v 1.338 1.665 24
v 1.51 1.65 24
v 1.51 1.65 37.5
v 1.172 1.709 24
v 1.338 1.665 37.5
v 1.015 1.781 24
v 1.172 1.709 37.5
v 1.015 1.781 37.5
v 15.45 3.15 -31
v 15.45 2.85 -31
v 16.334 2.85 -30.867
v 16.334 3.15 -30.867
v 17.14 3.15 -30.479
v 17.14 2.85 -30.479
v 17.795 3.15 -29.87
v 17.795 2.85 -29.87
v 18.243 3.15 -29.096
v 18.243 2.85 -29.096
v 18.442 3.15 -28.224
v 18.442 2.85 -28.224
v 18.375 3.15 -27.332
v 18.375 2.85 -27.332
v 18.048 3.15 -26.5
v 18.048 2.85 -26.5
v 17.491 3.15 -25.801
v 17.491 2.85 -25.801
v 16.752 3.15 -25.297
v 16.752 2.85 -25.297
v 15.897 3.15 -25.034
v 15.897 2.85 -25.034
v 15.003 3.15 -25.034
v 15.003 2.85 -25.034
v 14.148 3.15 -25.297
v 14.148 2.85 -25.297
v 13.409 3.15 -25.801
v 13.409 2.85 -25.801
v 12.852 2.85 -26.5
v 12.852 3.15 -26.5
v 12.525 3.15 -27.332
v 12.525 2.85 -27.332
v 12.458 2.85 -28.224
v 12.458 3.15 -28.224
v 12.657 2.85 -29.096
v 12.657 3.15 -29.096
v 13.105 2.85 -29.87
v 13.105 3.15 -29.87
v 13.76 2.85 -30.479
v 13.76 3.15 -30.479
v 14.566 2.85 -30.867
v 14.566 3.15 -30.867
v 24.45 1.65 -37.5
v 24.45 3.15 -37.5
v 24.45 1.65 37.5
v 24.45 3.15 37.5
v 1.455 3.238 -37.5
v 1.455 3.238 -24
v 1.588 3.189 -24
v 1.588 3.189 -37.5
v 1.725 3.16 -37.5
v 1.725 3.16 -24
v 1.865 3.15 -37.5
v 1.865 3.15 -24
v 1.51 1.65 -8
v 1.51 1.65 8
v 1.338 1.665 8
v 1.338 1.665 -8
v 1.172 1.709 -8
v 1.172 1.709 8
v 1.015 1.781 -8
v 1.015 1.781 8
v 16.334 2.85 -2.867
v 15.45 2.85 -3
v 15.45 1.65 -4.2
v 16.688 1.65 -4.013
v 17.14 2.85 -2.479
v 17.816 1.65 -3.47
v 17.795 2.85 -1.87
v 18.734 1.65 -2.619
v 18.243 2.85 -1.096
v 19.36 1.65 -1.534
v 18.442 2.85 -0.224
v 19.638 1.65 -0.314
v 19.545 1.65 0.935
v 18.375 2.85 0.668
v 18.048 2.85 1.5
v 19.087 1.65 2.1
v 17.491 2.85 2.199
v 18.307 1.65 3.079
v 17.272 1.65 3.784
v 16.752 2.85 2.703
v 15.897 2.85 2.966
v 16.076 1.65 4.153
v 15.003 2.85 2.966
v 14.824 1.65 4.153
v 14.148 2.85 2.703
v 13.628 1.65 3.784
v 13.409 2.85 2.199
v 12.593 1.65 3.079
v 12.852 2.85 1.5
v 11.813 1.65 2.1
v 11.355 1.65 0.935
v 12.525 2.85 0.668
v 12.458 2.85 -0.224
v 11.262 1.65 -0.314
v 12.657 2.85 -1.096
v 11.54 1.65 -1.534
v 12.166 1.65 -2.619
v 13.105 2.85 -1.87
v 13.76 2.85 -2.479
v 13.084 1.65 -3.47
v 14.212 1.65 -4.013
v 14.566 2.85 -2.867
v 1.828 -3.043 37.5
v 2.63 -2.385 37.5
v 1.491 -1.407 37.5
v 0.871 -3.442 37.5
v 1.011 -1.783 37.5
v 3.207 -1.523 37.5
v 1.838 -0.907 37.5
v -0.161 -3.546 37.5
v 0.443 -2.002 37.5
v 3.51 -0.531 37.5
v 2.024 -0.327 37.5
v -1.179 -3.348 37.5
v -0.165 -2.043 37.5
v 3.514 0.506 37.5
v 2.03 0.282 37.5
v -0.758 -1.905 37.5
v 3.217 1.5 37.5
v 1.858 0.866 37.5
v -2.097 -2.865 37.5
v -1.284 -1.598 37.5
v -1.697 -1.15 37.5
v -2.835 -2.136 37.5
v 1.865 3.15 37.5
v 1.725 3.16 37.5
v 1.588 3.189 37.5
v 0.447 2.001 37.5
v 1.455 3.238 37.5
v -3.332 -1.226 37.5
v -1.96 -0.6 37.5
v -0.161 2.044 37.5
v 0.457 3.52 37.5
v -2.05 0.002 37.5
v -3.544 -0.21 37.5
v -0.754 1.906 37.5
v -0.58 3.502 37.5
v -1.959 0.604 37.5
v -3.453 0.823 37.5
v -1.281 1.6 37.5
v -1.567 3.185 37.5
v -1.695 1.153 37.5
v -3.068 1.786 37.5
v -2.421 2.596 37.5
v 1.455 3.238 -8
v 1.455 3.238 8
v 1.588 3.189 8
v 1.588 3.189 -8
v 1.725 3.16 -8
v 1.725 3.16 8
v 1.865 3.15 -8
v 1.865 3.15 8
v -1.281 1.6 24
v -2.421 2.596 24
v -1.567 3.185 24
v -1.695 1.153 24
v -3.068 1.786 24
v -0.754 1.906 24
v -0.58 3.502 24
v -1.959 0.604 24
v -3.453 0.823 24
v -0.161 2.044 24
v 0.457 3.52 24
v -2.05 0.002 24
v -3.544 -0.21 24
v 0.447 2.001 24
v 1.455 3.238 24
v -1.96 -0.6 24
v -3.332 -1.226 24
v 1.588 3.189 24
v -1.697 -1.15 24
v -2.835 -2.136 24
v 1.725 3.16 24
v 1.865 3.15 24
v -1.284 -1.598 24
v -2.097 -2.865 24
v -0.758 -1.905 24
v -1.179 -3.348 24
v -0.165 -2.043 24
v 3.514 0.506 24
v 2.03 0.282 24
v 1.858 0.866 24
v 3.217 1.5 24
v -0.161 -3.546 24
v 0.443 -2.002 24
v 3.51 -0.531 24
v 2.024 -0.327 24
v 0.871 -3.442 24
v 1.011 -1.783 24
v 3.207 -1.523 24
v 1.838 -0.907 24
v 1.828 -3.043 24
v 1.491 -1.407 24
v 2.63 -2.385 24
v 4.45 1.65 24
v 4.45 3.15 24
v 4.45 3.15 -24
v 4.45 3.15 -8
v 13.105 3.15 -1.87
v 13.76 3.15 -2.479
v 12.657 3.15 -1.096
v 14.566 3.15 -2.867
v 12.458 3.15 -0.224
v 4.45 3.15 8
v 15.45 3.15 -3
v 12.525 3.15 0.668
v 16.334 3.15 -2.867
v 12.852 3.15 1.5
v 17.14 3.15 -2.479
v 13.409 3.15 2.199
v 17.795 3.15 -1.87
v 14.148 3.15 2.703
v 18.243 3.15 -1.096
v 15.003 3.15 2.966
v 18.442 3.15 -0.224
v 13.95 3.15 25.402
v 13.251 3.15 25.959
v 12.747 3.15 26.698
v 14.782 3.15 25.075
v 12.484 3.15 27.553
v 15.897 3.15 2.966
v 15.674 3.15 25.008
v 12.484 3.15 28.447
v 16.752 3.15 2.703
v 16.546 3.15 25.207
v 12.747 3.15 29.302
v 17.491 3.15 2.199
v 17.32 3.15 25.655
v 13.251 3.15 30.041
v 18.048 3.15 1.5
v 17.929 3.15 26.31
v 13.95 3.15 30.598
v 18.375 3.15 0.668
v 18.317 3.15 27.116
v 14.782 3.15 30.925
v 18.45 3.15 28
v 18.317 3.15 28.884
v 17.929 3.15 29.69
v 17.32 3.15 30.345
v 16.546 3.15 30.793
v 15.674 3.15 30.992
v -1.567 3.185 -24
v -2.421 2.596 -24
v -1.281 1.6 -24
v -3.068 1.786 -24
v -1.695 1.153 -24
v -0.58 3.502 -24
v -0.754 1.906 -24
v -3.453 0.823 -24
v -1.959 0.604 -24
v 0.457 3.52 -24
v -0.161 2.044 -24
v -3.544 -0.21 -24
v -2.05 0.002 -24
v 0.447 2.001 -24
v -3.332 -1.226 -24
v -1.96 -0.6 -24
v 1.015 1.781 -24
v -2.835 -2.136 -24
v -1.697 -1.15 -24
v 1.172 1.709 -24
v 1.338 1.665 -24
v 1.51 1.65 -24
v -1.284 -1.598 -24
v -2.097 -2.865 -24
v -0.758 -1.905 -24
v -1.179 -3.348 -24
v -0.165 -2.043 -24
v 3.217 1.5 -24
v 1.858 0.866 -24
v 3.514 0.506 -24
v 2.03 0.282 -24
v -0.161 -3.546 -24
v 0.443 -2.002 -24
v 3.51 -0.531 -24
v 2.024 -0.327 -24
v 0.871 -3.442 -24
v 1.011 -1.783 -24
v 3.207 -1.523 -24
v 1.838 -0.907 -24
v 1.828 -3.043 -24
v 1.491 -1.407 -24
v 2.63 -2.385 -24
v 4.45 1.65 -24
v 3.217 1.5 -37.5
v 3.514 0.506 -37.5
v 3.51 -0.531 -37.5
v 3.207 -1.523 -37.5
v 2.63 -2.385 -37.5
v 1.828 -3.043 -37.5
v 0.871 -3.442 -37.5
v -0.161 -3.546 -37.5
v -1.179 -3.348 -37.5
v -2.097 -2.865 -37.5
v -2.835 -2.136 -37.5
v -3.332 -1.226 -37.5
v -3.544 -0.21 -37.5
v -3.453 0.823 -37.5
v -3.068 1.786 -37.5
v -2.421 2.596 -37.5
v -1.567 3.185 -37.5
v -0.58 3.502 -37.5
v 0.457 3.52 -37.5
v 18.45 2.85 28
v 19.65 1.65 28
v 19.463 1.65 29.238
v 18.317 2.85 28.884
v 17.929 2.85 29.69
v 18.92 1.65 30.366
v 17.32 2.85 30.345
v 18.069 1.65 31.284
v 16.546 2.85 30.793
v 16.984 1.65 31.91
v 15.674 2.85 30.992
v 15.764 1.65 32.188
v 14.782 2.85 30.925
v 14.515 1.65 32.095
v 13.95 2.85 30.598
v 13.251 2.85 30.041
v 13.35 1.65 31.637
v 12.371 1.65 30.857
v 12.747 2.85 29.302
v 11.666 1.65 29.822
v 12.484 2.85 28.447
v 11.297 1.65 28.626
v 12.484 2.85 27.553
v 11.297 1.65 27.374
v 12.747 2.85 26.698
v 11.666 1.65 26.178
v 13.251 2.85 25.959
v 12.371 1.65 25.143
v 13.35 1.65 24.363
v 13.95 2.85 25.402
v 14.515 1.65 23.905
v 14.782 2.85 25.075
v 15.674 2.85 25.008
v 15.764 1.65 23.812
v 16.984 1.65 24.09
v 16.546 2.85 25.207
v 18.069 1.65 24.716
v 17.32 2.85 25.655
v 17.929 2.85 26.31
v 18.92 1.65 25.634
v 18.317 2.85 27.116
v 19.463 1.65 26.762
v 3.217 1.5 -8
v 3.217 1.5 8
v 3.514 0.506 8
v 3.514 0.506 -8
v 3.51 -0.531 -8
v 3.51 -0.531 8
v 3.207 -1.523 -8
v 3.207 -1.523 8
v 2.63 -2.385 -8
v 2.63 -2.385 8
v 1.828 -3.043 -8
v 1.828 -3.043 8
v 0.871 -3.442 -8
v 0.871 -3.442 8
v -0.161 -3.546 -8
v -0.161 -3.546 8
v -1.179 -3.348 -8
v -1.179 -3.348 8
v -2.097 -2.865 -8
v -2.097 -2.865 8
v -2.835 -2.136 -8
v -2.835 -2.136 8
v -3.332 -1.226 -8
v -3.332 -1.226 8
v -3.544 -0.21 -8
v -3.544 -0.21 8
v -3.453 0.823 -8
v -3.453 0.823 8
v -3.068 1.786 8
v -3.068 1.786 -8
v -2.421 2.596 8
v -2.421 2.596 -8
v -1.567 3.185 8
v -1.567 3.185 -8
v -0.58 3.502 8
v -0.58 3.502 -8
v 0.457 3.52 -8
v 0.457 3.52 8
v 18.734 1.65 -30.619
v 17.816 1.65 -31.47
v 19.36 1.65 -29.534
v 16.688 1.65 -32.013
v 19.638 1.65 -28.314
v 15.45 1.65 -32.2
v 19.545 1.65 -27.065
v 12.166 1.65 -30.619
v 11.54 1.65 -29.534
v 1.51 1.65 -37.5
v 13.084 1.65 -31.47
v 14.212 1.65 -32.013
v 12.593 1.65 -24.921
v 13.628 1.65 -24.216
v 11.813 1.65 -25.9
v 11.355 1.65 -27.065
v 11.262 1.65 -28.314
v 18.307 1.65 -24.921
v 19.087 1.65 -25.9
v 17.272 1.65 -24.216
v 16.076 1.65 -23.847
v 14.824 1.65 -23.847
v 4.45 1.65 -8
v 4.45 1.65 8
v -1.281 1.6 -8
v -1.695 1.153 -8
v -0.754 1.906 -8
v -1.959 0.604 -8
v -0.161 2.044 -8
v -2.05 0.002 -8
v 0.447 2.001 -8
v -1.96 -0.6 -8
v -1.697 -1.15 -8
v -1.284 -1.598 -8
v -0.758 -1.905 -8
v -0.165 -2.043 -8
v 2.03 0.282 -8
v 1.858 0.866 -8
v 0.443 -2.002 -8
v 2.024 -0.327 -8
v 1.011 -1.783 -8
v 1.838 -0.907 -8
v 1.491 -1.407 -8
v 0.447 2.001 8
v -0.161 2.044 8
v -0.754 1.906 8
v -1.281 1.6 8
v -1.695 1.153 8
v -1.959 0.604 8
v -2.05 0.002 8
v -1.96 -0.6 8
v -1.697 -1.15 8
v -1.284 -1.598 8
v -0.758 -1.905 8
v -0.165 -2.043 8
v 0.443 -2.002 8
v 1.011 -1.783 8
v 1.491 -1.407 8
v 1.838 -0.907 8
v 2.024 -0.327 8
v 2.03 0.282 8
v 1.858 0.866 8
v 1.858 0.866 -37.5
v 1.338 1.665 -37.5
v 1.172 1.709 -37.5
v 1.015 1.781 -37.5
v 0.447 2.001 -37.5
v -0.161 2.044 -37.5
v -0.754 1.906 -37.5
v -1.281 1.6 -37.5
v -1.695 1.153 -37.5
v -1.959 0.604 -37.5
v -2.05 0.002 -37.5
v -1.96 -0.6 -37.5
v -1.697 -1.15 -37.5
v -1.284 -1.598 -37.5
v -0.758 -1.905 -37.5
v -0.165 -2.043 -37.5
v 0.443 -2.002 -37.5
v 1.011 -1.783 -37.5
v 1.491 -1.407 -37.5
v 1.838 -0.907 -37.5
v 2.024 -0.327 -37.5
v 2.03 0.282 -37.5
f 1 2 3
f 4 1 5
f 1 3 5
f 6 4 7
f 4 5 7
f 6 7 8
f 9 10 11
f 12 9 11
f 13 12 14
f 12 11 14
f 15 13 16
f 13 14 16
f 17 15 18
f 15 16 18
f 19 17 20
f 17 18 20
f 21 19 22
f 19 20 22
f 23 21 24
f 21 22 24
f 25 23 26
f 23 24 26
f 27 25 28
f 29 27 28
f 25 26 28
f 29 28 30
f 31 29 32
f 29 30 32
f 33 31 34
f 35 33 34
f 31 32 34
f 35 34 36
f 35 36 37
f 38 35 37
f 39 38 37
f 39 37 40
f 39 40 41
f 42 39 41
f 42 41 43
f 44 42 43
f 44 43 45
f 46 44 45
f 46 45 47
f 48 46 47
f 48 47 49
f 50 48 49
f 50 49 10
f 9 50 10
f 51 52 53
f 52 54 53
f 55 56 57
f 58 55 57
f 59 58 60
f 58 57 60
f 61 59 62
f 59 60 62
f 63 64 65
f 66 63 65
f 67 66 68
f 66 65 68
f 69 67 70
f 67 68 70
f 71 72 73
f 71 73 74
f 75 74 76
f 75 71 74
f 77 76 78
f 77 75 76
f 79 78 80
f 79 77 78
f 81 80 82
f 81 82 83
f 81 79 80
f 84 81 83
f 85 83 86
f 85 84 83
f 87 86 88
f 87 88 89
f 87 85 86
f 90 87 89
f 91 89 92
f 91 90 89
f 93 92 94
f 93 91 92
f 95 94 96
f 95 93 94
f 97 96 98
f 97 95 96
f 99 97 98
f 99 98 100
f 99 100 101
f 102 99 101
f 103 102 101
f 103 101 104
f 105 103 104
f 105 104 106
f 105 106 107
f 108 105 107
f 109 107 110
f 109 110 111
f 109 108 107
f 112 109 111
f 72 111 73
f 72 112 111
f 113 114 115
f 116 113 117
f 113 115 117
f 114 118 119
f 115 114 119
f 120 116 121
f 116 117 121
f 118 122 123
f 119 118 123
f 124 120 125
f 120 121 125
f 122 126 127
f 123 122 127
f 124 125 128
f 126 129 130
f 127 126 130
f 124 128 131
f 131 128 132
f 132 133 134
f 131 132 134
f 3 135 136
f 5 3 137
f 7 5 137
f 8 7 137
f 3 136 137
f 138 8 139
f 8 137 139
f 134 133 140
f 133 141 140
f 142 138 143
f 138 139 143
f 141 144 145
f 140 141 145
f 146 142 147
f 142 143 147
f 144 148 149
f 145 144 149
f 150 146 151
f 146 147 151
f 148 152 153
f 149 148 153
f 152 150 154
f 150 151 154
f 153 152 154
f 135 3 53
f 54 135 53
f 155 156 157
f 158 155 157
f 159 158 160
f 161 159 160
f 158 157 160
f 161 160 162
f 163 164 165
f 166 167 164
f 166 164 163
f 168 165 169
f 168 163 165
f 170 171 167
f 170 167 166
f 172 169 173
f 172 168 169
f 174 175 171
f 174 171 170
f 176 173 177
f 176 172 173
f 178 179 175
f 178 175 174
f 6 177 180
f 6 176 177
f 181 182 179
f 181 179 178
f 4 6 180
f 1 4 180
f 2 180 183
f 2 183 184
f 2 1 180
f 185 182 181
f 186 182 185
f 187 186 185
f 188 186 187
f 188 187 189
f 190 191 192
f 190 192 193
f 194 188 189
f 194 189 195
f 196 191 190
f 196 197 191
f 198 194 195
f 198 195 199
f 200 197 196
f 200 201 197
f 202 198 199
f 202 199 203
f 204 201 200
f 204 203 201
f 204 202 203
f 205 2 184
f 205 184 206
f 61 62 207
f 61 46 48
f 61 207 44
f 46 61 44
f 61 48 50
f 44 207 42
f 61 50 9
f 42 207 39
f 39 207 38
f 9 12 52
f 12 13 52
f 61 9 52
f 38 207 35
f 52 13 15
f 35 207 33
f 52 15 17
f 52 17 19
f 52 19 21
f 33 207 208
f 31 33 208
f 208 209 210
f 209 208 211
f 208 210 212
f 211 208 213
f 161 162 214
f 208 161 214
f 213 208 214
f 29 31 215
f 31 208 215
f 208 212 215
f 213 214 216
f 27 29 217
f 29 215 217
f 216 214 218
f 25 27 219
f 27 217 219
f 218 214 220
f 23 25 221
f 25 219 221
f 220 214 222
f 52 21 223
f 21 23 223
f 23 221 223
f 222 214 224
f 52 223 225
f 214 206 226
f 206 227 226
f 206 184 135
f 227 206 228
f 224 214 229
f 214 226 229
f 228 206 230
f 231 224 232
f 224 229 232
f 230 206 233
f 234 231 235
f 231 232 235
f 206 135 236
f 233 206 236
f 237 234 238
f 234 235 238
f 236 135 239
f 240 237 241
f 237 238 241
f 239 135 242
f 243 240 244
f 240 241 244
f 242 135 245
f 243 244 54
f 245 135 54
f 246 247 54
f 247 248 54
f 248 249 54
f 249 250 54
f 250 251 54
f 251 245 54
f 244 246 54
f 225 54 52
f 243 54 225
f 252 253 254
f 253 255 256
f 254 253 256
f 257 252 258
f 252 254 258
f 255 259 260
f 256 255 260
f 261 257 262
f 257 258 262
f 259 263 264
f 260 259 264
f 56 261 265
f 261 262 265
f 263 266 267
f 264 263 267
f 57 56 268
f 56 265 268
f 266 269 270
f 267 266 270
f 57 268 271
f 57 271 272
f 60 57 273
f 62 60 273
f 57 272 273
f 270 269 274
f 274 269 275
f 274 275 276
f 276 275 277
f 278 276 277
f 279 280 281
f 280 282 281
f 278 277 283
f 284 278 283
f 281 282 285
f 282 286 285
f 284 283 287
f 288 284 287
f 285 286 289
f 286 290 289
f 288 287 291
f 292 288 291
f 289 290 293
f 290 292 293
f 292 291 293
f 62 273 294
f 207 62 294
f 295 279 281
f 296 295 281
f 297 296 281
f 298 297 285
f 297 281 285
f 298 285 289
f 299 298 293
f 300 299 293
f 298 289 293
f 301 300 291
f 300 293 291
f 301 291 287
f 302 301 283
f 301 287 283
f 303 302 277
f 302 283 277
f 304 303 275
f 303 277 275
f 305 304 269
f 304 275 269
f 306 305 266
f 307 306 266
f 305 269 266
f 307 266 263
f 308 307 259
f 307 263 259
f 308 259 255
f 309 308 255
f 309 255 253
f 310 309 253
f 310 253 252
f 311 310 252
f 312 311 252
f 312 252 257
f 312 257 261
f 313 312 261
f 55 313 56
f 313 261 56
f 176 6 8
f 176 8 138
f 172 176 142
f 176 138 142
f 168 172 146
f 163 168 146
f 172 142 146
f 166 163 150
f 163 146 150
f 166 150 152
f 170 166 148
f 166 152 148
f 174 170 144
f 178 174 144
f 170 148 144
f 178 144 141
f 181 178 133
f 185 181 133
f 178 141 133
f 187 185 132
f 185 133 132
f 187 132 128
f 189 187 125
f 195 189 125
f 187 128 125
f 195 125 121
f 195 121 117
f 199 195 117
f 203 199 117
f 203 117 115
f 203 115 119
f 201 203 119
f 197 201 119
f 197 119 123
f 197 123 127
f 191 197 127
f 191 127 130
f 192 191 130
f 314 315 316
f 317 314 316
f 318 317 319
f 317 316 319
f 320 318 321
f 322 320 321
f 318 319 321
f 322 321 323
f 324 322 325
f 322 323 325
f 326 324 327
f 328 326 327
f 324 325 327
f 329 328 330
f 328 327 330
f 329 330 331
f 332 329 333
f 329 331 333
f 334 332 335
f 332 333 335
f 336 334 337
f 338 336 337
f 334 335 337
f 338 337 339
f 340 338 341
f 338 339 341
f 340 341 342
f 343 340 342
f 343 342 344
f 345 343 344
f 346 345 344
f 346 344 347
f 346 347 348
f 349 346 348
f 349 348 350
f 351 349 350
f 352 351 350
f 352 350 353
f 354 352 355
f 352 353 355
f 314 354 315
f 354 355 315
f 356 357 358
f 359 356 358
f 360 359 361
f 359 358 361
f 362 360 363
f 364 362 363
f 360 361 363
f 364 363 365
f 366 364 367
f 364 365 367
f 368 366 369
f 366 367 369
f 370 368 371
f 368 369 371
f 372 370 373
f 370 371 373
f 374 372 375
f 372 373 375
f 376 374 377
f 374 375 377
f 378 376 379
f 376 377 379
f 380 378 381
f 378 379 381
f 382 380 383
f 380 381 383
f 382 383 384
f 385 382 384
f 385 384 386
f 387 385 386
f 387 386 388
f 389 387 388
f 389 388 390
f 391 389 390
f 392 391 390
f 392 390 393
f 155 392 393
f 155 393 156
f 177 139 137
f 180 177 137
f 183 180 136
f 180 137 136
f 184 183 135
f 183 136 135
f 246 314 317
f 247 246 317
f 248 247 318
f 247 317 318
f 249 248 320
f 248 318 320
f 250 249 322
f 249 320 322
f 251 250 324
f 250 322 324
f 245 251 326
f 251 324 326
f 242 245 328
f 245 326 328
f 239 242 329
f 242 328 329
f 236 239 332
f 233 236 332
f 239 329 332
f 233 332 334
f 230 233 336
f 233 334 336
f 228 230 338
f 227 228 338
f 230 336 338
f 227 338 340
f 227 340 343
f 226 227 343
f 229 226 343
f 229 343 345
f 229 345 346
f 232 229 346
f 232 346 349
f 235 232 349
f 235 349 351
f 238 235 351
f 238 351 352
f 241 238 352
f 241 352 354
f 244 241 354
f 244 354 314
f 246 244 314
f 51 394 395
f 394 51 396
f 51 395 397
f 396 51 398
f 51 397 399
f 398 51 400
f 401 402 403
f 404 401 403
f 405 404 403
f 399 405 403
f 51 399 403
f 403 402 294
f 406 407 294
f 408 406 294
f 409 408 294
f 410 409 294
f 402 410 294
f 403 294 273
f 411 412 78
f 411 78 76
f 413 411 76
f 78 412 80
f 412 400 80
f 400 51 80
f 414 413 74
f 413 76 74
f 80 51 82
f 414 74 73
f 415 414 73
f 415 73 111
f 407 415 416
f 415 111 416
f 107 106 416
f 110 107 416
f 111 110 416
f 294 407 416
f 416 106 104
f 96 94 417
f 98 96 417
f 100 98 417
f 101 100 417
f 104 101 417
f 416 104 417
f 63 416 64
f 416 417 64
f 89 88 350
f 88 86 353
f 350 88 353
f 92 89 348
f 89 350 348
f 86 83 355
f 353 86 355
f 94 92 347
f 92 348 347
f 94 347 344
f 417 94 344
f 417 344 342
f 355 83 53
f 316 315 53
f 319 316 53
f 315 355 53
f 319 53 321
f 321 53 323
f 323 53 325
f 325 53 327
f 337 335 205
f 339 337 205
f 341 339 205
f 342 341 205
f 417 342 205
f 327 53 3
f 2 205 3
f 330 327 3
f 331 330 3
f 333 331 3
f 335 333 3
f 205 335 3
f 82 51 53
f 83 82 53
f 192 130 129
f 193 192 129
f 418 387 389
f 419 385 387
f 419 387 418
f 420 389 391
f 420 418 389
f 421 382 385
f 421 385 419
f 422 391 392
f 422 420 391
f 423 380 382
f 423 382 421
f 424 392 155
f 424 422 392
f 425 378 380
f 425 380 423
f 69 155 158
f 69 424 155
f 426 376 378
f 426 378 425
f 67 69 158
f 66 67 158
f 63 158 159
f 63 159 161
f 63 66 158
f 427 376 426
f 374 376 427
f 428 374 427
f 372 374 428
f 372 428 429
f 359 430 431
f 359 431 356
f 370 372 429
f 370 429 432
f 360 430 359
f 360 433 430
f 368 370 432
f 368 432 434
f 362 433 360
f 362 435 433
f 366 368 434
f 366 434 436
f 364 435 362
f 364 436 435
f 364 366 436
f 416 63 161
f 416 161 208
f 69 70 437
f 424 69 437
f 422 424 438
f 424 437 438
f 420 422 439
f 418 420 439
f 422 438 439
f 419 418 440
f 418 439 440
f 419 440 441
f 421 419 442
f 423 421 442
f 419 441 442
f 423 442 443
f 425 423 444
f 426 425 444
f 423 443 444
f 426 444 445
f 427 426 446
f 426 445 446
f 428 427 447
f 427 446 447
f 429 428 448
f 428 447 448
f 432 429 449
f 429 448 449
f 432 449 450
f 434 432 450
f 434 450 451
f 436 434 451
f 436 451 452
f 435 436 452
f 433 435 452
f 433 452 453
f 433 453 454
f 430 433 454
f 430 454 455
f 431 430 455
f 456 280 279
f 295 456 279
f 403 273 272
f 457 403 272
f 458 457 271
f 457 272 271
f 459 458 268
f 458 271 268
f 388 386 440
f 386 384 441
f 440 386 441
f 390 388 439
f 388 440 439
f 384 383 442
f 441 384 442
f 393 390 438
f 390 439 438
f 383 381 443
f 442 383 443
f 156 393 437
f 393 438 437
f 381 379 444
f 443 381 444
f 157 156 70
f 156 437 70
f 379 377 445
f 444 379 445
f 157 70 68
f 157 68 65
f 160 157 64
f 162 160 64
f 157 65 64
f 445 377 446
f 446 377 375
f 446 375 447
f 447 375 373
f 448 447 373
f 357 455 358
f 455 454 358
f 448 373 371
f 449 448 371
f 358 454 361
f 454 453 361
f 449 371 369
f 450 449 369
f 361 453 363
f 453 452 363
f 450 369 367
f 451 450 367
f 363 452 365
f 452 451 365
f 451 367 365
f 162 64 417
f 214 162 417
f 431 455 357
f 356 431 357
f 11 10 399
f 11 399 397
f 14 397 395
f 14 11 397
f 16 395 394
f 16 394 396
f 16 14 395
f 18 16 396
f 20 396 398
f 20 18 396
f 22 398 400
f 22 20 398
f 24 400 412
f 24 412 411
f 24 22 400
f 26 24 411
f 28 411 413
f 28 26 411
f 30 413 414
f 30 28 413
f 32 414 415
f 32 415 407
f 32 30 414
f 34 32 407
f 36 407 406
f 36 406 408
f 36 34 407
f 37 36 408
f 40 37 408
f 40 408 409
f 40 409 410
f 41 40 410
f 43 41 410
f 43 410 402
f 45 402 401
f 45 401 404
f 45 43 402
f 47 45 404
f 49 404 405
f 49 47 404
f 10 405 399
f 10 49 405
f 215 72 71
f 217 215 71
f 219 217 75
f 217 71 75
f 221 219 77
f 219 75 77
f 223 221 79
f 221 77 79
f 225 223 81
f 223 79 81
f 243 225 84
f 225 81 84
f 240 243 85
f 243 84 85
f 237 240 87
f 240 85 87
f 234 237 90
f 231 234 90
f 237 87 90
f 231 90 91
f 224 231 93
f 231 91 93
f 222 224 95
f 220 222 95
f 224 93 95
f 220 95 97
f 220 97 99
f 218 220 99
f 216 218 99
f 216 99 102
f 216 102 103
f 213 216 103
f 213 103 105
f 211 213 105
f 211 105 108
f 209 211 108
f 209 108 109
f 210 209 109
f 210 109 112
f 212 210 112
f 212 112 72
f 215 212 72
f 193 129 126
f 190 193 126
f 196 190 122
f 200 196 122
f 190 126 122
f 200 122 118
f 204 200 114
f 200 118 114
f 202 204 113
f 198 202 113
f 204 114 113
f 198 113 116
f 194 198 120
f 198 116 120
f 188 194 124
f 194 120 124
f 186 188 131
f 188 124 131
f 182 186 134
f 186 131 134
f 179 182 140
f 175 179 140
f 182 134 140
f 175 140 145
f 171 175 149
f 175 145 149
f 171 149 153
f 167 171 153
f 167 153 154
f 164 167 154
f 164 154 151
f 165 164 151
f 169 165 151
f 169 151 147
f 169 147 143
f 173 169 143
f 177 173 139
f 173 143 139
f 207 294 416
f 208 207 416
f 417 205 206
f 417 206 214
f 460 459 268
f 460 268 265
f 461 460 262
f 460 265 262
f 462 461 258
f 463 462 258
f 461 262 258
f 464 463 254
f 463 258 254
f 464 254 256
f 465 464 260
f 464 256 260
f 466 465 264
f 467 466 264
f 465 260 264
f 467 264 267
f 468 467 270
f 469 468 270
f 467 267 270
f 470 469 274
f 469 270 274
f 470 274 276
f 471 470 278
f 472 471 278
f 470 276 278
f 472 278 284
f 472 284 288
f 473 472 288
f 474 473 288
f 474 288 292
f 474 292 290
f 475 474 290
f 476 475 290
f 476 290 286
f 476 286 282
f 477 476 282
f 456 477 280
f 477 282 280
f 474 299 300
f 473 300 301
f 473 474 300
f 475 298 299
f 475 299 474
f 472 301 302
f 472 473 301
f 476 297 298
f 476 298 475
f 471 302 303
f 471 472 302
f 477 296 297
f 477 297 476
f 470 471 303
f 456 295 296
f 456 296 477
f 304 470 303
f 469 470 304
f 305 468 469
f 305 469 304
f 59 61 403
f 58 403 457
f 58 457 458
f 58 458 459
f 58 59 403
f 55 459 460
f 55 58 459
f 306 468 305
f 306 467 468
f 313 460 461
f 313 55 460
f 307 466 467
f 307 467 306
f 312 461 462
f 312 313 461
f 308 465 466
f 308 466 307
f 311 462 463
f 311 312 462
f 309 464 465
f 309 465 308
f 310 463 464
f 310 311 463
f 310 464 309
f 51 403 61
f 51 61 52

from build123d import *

# Parameters (mm, degrees)
BOSS_EXTRUDE1_DEPTH     = 37.5
SKETCH4_R               = 3
CUT_EXTRUDE3_DEPTH      = 46.067643604
LPATTERN1_COUNT         = 2
LPATTERN1_PITCH         = 28
MIRROR1_COPY_1_SKETCH_R = 3
MIRROR1_COPY_1_DEPTH    = 46.067643604
MIRROR1_COPY_2_SKETCH_R = 3
MIRROR1_COPY_2_DEPTH    = 46.067643604
CHAMFER1_SIZE           = 1.2
SKETCH2_W               = 8
SKETCH2_H               = 16
CUT_EXTRUDE4_DEPTH      = 46.067643604


with BuildPart() as part:
    # Sketch1 → Boss-Extrude1 (new, symmetric)
    with BuildSketch(Plane.XY):
        with BuildLine():
            Line((1.865475811, 3.15), (24.45, 3.15))
            Line((24.45, 3.15), (24.45, 1.65))
            Line((24.45, 1.65), (1.509966887, 1.65))
            ThreePointArc((1.509966887, 1.65), (1.253893127, 1.683342755), (1.014895777, 1.781147541))
            ThreePointArc((1.014895777, 1.781147541), (-1.507477704, -1.389248347), (1.857930963, 0.866367437))
            Line((1.857930963, 0.866367437), (3.217392644, 1.500294829))
            ThreePointArc((3.217392644, 1.500294829), (-2.492742617, -2.527594557), (1.455481127, 3.237912088))
            ThreePointArc((1.455481127, 3.237912088), (1.655818843, 3.172224997), (1.865475811, 3.15))
        make_face()
    extrude(amount=BOSS_EXTRUDE1_DEPTH, both=True)

    # Sketch4 → Cut-Extrude3 (cut, through all)
    with BuildSketch(Plane.XZ.offset(-1.65)):
        with Locations(Location((15.45, 0, 0), (0, 0, 270))):
            Circle(SKETCH4_R)
    cut_extrude3 = extrude(amount=-CUT_EXTRUDE3_DEPTH, mode=Mode.SUBTRACT)

    # LPattern1: Cut-Extrude3 ×2
    with Locations(*[(0, 0, -i * LPATTERN1_PITCH) for i in range(1, LPATTERN1_COUNT)]):
        add(cut_extrude3, mode=Mode.SUBTRACT)

    # Mirror1 copy 1 sketch → Mirror1 copy 1 (cut, through all)
    with BuildSketch(Plane(origin=(0, 1.65, 28), x_dir=(1, 0, 0), z_dir=(0, -1, 0))):
        with Locations((15.45, 0)):
            Circle(MIRROR1_COPY_1_SKETCH_R)
    extrude(amount=-MIRROR1_COPY_1_DEPTH, mode=Mode.SUBTRACT)

    # Mirror1 copy 2 sketch → Mirror1 copy 2 (cut, through all)
    with BuildSketch(Plane.XZ.offset(-1.65)):
        with Locations((15.45, 0)):
            Circle(MIRROR1_COPY_2_SKETCH_R)
    extrude(amount=-MIRROR1_COPY_2_DEPTH, mode=Mode.SUBTRACT)

    # Chamfer1
    chamfer1_edges = [part.edges().sort_by_distance(p)[0] for p in [
        (15.45, 1.65, 3),
        (15.45, 1.65, -25),
        (12.45, 1.65, 28),
    ]]
    chamfer(chamfer1_edges, length=CHAMFER1_SIZE)

    # Sketch2 → Cut-Extrude4 (cut, symmetric)
    with BuildSketch(Plane.XZ.offset(-1.65)):
        with Locations((0.45, -16)):
            Rectangle(SKETCH2_W, SKETCH2_H)
    cut_extrude4 = extrude(amount=CUT_EXTRUDE4_DEPTH, both=True, mode=Mode.SUBTRACT)

    # Mirror2: Cut-Extrude4 across plane
    add(cut_extrude4.mirror(Plane.XY), mode=Mode.SUBTRACT)


solid = part.part
